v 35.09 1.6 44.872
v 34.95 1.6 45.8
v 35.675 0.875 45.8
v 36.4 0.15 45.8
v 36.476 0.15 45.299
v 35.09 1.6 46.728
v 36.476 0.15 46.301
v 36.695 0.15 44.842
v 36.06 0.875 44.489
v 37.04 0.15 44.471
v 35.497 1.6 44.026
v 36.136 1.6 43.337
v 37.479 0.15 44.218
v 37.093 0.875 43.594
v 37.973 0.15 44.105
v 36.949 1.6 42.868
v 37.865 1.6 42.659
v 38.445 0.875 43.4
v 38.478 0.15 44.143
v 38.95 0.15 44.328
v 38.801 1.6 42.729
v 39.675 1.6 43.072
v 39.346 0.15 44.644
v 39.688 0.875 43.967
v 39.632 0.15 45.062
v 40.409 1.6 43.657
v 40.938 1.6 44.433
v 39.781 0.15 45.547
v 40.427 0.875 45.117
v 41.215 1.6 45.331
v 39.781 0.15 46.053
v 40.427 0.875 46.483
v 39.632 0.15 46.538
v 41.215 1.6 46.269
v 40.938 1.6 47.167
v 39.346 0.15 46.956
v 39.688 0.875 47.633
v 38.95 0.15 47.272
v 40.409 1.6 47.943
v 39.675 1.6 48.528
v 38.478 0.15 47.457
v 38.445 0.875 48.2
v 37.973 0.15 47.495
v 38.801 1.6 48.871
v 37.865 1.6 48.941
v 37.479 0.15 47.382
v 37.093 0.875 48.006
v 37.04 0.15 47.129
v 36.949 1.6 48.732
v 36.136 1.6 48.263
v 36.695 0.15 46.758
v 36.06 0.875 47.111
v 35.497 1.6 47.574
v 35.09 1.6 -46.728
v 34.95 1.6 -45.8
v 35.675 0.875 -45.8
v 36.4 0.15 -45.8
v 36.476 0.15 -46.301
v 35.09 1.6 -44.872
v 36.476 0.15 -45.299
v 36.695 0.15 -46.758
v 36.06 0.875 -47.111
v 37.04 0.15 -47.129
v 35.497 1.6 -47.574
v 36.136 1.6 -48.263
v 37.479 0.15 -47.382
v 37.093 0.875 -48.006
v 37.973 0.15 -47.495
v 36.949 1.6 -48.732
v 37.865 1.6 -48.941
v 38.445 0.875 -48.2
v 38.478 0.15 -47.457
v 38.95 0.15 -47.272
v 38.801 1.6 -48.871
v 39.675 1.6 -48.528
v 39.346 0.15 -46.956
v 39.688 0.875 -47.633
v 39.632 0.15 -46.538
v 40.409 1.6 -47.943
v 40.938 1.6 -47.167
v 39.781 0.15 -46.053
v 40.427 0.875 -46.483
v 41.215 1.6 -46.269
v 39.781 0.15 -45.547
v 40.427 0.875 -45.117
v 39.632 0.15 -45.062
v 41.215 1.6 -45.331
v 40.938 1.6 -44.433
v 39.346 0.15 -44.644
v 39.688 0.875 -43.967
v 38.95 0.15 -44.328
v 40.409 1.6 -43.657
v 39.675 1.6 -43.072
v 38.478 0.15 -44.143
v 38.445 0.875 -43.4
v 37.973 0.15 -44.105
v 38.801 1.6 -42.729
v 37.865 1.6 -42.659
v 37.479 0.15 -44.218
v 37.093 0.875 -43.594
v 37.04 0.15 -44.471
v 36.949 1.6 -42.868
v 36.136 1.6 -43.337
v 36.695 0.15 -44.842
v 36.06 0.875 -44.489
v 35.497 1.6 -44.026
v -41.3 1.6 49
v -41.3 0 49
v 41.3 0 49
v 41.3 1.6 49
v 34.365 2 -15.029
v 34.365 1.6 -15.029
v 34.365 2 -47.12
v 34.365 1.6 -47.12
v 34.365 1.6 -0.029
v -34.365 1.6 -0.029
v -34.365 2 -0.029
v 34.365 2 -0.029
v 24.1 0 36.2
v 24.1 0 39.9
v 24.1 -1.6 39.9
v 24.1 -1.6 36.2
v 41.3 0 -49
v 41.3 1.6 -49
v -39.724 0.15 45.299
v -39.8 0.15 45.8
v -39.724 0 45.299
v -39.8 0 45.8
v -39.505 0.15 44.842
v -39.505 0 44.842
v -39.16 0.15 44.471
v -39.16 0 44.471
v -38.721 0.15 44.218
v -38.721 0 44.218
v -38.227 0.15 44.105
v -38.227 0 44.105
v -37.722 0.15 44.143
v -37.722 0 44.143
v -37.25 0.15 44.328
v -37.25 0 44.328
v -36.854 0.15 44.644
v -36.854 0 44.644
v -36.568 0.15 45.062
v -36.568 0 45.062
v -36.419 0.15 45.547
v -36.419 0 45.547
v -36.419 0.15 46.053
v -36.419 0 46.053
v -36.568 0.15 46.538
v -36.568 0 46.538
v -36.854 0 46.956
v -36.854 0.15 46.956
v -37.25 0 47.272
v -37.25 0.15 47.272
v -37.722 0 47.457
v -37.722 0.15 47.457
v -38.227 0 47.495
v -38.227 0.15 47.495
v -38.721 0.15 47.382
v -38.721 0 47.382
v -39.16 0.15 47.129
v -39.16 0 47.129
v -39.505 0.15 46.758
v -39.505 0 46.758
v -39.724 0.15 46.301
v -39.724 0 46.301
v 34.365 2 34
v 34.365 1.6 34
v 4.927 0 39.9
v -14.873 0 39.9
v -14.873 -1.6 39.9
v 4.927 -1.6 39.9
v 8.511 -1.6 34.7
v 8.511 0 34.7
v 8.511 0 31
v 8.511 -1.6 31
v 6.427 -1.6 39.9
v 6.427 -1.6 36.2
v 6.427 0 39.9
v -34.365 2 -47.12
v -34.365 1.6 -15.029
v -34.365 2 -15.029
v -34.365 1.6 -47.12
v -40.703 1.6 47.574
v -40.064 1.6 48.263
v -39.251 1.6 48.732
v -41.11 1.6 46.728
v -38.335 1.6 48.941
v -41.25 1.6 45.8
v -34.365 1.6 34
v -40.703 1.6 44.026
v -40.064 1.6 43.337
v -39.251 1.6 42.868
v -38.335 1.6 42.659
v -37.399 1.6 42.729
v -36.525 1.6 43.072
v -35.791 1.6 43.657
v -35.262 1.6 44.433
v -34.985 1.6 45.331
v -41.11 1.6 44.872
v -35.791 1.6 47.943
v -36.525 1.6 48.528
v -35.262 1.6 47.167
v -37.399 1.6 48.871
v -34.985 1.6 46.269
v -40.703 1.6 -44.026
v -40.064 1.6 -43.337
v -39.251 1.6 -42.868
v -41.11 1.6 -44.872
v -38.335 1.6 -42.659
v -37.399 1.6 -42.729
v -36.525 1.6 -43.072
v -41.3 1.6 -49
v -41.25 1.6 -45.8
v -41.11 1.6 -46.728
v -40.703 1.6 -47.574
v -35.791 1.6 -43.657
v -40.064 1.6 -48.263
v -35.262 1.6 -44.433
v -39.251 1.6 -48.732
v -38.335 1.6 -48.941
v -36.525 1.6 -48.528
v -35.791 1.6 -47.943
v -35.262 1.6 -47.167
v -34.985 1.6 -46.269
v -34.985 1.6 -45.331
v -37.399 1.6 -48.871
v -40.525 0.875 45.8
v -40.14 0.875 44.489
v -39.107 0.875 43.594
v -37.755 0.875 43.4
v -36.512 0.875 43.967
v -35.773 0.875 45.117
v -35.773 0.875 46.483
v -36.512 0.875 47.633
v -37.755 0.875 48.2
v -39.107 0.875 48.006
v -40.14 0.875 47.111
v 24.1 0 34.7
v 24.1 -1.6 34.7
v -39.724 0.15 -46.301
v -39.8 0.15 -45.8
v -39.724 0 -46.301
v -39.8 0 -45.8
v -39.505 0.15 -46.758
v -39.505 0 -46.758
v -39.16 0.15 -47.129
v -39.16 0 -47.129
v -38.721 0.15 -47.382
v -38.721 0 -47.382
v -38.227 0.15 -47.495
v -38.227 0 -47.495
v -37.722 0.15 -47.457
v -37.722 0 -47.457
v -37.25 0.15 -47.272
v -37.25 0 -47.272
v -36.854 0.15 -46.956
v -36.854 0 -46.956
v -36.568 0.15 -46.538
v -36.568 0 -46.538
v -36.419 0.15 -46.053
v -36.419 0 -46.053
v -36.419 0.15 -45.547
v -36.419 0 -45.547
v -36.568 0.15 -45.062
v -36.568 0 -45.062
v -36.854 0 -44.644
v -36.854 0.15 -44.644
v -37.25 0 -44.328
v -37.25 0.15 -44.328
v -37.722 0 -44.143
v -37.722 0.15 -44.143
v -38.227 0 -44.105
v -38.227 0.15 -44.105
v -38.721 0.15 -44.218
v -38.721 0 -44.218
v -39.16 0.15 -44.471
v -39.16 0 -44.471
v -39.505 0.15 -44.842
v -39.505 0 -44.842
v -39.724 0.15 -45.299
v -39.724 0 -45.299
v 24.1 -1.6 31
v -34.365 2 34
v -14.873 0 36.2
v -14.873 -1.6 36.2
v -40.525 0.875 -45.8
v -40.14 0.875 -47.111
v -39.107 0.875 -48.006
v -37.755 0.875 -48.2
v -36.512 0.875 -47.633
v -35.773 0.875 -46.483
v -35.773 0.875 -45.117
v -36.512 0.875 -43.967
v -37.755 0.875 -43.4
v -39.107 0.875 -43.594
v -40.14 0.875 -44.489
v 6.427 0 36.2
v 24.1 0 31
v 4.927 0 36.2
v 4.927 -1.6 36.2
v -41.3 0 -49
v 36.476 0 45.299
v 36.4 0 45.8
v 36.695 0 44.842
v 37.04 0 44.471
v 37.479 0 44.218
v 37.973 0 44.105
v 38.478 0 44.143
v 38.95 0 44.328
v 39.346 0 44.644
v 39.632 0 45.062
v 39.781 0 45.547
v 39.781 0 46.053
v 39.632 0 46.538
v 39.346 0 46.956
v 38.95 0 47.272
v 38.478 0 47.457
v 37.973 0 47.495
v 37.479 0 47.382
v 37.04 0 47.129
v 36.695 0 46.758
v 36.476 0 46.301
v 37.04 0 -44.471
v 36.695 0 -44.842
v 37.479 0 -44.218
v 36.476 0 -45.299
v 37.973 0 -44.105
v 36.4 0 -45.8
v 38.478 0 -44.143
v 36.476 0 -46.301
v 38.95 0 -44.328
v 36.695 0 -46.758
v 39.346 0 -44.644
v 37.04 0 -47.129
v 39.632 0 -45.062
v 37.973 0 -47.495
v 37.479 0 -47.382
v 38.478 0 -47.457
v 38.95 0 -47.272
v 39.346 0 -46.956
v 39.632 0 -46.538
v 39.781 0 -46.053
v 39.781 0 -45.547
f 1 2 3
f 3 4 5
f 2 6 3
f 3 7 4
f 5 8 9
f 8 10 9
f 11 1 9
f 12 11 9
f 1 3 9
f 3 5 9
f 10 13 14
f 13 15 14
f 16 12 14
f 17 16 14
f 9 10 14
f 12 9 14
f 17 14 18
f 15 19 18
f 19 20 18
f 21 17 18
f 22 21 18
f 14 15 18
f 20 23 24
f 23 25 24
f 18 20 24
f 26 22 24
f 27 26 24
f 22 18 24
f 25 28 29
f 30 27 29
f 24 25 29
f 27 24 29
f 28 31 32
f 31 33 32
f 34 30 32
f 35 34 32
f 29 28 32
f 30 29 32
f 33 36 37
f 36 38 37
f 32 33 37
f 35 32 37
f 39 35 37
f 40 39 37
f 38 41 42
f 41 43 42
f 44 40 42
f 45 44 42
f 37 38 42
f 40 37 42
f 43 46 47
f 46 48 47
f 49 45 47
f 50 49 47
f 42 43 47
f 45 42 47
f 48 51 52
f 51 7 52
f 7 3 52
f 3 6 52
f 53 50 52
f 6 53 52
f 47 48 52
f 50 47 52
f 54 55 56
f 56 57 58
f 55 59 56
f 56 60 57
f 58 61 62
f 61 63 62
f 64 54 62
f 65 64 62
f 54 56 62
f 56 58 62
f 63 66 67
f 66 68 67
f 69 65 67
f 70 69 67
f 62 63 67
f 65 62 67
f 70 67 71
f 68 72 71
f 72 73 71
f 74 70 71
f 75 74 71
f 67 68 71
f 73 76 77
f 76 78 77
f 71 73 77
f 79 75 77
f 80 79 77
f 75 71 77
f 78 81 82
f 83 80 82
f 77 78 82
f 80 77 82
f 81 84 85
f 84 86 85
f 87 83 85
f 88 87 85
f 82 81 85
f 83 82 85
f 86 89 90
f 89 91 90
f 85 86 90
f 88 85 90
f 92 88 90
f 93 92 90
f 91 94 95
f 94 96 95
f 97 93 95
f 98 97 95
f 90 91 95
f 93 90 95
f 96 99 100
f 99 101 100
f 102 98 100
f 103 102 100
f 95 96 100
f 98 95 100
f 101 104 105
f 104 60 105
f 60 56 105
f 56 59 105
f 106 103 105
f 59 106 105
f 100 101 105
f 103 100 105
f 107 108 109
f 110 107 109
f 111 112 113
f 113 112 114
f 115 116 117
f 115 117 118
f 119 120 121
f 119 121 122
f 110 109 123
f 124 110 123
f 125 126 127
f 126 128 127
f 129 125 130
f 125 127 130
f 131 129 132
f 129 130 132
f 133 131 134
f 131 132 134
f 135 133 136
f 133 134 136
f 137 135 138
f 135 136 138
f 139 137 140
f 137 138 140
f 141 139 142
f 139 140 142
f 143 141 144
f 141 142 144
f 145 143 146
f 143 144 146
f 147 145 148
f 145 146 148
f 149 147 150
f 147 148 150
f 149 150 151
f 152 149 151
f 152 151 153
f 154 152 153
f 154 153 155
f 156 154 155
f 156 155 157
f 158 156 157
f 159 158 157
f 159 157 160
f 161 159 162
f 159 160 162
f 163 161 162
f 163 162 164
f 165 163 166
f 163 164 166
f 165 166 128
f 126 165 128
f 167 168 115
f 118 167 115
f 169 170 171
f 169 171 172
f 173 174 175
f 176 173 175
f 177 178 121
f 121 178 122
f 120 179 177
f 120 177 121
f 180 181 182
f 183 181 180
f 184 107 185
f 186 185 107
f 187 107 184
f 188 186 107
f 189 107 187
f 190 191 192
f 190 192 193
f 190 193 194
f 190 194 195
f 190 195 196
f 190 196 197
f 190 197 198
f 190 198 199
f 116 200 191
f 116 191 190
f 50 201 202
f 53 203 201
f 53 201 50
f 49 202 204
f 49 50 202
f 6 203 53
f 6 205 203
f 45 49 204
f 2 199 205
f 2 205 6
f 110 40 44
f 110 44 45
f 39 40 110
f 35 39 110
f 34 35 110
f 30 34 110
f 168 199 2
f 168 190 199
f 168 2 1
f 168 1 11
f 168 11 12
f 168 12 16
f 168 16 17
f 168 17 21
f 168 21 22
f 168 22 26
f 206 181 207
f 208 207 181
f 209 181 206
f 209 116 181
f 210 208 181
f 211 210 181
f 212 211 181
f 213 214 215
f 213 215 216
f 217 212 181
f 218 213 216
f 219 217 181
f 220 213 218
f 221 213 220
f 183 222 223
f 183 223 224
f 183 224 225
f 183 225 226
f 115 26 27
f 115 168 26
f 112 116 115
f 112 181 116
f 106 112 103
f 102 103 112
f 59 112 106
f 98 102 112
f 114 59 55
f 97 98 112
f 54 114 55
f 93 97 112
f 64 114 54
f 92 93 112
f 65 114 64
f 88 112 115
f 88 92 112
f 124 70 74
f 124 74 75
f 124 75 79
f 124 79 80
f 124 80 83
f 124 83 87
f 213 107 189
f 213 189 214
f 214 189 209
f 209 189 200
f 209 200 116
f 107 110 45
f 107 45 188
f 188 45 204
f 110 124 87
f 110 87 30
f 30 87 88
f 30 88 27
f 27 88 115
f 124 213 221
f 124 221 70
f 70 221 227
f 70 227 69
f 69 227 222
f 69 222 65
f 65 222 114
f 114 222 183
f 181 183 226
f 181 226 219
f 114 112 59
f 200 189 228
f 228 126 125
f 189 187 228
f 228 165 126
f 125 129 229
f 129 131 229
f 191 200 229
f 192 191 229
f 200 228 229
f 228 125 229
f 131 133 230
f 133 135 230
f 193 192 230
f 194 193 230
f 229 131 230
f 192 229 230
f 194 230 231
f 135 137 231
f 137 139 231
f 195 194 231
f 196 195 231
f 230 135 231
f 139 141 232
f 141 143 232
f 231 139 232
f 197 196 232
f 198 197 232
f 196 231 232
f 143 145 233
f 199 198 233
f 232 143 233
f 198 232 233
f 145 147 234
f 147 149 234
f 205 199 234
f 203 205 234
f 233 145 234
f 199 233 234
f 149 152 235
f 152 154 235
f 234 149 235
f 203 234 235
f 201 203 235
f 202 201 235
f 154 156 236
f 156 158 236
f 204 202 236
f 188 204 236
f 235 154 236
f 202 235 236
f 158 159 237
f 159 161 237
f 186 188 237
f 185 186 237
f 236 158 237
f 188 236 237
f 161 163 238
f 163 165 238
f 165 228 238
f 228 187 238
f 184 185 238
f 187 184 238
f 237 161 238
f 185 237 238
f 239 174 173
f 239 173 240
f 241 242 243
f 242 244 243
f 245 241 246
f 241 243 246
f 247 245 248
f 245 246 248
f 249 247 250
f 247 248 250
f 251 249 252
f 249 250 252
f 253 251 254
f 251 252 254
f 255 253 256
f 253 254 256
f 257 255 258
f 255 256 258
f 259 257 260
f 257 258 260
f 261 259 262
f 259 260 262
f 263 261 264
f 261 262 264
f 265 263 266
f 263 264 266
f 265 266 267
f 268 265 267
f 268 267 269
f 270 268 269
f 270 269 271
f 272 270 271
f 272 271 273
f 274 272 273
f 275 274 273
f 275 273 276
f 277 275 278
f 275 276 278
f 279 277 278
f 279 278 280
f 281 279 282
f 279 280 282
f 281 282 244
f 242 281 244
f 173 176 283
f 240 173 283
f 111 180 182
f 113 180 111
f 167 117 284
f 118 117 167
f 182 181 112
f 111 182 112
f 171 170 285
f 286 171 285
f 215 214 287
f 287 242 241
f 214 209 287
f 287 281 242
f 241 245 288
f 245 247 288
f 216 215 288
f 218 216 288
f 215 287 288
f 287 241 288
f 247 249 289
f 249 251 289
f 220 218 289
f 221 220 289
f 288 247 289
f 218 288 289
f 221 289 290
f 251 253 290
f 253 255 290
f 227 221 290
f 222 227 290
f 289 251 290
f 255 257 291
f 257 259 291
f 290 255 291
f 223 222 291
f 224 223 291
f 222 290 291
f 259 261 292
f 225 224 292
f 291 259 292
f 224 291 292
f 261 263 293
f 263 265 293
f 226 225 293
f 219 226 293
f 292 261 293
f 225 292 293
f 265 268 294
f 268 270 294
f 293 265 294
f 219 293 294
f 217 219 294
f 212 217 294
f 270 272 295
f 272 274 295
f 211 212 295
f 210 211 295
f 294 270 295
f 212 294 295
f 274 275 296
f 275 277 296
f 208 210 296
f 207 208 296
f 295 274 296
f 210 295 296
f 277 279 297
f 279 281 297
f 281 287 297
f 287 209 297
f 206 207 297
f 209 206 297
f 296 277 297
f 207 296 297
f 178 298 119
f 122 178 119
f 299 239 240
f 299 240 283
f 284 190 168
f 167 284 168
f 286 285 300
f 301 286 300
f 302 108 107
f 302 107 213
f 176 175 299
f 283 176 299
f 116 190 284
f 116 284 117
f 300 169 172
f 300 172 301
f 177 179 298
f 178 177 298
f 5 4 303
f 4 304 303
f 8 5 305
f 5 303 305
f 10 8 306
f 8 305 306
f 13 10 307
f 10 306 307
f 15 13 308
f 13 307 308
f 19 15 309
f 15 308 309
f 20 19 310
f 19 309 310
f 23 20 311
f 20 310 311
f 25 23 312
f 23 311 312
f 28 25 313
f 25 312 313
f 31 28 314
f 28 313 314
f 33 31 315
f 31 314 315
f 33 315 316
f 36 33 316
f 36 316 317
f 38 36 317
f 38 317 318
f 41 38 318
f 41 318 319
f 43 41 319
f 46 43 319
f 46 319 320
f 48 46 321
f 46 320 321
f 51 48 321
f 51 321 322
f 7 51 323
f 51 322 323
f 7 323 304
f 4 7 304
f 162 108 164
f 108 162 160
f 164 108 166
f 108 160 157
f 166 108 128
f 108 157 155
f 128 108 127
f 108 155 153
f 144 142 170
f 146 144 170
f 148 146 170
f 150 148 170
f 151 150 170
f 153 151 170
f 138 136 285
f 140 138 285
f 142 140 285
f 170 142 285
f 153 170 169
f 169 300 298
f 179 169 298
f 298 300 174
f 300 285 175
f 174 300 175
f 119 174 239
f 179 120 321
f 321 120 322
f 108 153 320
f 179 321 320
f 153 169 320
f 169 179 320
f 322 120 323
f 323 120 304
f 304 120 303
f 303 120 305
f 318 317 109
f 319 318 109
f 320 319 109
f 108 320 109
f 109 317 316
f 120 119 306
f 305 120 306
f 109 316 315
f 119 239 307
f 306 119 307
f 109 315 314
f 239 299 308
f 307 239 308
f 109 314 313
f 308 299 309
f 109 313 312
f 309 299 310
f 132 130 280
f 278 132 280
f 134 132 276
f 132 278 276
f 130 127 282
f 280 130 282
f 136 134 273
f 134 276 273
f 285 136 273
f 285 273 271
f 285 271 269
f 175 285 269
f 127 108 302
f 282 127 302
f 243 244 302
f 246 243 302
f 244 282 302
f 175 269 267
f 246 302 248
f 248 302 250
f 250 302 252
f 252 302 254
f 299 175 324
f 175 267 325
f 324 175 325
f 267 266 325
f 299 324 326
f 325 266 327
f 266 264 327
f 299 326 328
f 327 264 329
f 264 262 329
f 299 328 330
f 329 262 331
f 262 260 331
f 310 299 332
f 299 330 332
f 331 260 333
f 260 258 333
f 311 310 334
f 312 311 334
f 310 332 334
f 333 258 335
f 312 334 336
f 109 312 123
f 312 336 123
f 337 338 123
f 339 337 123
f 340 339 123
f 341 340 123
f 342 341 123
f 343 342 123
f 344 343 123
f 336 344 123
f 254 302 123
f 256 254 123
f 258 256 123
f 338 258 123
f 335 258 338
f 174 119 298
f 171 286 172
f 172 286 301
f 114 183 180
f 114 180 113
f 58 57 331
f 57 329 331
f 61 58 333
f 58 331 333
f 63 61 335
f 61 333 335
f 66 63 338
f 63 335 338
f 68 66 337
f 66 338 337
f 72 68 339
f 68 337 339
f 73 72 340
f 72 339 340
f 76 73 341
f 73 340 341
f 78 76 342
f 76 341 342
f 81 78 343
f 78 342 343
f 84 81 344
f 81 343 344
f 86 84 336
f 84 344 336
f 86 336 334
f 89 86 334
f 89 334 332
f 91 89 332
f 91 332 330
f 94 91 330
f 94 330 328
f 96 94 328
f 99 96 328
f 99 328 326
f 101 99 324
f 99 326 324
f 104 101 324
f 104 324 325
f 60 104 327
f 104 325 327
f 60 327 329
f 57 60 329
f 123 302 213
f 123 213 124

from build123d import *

# Parameters (mm, degrees)
SKETCH1_W                                       = 82.6
SKETCH1_H                                       = 98
SKETCH1_R                                       = 1.6
BOSS_EXTRUDE1_DEPTH                             = 1.6
SKETCH1_3_W                                     = 19.8
SKETCH1_3_H                                     = 3.7
SKETCH1_3_W_2                                   = 17.672668113
SKETCH1_3_W_3                                   = 15.589154013
BOSS_EXTRUDE2_DEPTH                             = 1.6
SKETCH2_W                                       = 68.729308582
SKETCH2_H                                       = 32.090135436
SKETCH2_H_2                                     = 34.029409061
BOSS_EXTRUDE3_DEPTH                             = 0.4
CSK_FOR_M3_FLAT_HEAD_MACHINE_SCREW1_D           = 3.4
CSK_FOR_M3_FLAT_HEAD_MACHINE_SCREW1_DEPTH       = 3.15
CSK_FOR_M3_FLAT_HEAD_MACHINE_SCREW1_CSINK_D     = 6.3
CSK_FOR_M3_FLAT_HEAD_MACHINE_SCREW1_CSINK_ANGLE = 90
CSK_FOR_M3_FLAT_HEAD_MACHINE_SCREW1_TIP         = 1.021463052


with BuildPart() as part:
    # Sketch1 → Boss-Extrude1 (new body)
    with BuildSketch(Plane(origin=(0, 0, 0), x_dir=(1, 0, 0), z_dir=(0, 1, 0))):
        Rectangle(SKETCH1_W, SKETCH1_H)
        with Locations((-38.1, -45.8)):
            Circle(SKETCH1_R, mode=Mode.SUBTRACT)
        with Locations((38.1, -45.8)):
            Circle(SKETCH1_R, mode=Mode.SUBTRACT)
        with Locations((-38.1, 45.8)):
            Circle(SKETCH1_R, mode=Mode.SUBTRACT)
        with Locations((38.1, 45.8)):
            Circle(SKETCH1_R, mode=Mode.SUBTRACT)
    extrude(amount=BOSS_EXTRUDE1_DEPTH)

    # Sketch1<3> → Boss-Extrude2 (add)
    with BuildSketch(Plane(origin=(0, 0, 0), x_dir=(1, 0, 0), z_dir=(0, 1, 0))):
        with Locations((-4.972668113, -38.05)):
            Rectangle(SKETCH1_3_W, SKETCH1_3_H)
        with Locations((15.263665944, -38.05)):
            Rectangle(SKETCH1_3_W_2, SKETCH1_3_H)
        with Locations((16.305422994, -32.85)):
            Rectangle(SKETCH1_3_W_3, SKETCH1_3_H)
    extrude(amount=-BOSS_EXTRUDE2_DEPTH)

    # Sketch2 → Boss-Extrude3 (add)
    with BuildSketch(Plane(origin=(0, 1.6, 0), x_dir=(1, 0, 0), z_dir=(0, 1, 0))):
        with Locations((0, 31.074476779)):
            Rectangle(SKETCH2_W, SKETCH2_H)
        with Locations((0, -16.985295469)):
            Rectangle(SKETCH2_W, SKETCH2_H_2)
    extrude(amount=BOSS_EXTRUDE3_DEPTH)

    # CSK for M3 Flat Head Machine Screw1
    with Locations(Plane(origin=(0, 1.6, 0), x_dir=(1, 0, 0), z_dir=(0, 1, 0))):
        with Locations((-38.1, 45.8), (38.1, 45.8), (38.1, -45.8), (-38.1, -45.8)):
            CounterSinkHole(CSK_FOR_M3_FLAT_HEAD_MACHINE_SCREW1_D / 2, CSK_FOR_M3_FLAT_HEAD_MACHINE_SCREW1_CSINK_D / 2, depth=CSK_FOR_M3_FLAT_HEAD_MACHINE_SCREW1_DEPTH, counter_sink_angle=CSK_FOR_M3_FLAT_HEAD_MACHINE_SCREW1_CSINK_ANGLE)
            with Locations((0, 0, -(CSK_FOR_M3_FLAT_HEAD_MACHINE_SCREW1_DEPTH + CSK_FOR_M3_FLAT_HEAD_MACHINE_SCREW1_TIP / 2))):  # 118° drill point
                Cone(0, CSK_FOR_M3_FLAT_HEAD_MACHINE_SCREW1_D / 2, CSK_FOR_M3_FLAT_HEAD_MACHINE_SCREW1_TIP, mode=Mode.SUBTRACT)


solid = part.part
